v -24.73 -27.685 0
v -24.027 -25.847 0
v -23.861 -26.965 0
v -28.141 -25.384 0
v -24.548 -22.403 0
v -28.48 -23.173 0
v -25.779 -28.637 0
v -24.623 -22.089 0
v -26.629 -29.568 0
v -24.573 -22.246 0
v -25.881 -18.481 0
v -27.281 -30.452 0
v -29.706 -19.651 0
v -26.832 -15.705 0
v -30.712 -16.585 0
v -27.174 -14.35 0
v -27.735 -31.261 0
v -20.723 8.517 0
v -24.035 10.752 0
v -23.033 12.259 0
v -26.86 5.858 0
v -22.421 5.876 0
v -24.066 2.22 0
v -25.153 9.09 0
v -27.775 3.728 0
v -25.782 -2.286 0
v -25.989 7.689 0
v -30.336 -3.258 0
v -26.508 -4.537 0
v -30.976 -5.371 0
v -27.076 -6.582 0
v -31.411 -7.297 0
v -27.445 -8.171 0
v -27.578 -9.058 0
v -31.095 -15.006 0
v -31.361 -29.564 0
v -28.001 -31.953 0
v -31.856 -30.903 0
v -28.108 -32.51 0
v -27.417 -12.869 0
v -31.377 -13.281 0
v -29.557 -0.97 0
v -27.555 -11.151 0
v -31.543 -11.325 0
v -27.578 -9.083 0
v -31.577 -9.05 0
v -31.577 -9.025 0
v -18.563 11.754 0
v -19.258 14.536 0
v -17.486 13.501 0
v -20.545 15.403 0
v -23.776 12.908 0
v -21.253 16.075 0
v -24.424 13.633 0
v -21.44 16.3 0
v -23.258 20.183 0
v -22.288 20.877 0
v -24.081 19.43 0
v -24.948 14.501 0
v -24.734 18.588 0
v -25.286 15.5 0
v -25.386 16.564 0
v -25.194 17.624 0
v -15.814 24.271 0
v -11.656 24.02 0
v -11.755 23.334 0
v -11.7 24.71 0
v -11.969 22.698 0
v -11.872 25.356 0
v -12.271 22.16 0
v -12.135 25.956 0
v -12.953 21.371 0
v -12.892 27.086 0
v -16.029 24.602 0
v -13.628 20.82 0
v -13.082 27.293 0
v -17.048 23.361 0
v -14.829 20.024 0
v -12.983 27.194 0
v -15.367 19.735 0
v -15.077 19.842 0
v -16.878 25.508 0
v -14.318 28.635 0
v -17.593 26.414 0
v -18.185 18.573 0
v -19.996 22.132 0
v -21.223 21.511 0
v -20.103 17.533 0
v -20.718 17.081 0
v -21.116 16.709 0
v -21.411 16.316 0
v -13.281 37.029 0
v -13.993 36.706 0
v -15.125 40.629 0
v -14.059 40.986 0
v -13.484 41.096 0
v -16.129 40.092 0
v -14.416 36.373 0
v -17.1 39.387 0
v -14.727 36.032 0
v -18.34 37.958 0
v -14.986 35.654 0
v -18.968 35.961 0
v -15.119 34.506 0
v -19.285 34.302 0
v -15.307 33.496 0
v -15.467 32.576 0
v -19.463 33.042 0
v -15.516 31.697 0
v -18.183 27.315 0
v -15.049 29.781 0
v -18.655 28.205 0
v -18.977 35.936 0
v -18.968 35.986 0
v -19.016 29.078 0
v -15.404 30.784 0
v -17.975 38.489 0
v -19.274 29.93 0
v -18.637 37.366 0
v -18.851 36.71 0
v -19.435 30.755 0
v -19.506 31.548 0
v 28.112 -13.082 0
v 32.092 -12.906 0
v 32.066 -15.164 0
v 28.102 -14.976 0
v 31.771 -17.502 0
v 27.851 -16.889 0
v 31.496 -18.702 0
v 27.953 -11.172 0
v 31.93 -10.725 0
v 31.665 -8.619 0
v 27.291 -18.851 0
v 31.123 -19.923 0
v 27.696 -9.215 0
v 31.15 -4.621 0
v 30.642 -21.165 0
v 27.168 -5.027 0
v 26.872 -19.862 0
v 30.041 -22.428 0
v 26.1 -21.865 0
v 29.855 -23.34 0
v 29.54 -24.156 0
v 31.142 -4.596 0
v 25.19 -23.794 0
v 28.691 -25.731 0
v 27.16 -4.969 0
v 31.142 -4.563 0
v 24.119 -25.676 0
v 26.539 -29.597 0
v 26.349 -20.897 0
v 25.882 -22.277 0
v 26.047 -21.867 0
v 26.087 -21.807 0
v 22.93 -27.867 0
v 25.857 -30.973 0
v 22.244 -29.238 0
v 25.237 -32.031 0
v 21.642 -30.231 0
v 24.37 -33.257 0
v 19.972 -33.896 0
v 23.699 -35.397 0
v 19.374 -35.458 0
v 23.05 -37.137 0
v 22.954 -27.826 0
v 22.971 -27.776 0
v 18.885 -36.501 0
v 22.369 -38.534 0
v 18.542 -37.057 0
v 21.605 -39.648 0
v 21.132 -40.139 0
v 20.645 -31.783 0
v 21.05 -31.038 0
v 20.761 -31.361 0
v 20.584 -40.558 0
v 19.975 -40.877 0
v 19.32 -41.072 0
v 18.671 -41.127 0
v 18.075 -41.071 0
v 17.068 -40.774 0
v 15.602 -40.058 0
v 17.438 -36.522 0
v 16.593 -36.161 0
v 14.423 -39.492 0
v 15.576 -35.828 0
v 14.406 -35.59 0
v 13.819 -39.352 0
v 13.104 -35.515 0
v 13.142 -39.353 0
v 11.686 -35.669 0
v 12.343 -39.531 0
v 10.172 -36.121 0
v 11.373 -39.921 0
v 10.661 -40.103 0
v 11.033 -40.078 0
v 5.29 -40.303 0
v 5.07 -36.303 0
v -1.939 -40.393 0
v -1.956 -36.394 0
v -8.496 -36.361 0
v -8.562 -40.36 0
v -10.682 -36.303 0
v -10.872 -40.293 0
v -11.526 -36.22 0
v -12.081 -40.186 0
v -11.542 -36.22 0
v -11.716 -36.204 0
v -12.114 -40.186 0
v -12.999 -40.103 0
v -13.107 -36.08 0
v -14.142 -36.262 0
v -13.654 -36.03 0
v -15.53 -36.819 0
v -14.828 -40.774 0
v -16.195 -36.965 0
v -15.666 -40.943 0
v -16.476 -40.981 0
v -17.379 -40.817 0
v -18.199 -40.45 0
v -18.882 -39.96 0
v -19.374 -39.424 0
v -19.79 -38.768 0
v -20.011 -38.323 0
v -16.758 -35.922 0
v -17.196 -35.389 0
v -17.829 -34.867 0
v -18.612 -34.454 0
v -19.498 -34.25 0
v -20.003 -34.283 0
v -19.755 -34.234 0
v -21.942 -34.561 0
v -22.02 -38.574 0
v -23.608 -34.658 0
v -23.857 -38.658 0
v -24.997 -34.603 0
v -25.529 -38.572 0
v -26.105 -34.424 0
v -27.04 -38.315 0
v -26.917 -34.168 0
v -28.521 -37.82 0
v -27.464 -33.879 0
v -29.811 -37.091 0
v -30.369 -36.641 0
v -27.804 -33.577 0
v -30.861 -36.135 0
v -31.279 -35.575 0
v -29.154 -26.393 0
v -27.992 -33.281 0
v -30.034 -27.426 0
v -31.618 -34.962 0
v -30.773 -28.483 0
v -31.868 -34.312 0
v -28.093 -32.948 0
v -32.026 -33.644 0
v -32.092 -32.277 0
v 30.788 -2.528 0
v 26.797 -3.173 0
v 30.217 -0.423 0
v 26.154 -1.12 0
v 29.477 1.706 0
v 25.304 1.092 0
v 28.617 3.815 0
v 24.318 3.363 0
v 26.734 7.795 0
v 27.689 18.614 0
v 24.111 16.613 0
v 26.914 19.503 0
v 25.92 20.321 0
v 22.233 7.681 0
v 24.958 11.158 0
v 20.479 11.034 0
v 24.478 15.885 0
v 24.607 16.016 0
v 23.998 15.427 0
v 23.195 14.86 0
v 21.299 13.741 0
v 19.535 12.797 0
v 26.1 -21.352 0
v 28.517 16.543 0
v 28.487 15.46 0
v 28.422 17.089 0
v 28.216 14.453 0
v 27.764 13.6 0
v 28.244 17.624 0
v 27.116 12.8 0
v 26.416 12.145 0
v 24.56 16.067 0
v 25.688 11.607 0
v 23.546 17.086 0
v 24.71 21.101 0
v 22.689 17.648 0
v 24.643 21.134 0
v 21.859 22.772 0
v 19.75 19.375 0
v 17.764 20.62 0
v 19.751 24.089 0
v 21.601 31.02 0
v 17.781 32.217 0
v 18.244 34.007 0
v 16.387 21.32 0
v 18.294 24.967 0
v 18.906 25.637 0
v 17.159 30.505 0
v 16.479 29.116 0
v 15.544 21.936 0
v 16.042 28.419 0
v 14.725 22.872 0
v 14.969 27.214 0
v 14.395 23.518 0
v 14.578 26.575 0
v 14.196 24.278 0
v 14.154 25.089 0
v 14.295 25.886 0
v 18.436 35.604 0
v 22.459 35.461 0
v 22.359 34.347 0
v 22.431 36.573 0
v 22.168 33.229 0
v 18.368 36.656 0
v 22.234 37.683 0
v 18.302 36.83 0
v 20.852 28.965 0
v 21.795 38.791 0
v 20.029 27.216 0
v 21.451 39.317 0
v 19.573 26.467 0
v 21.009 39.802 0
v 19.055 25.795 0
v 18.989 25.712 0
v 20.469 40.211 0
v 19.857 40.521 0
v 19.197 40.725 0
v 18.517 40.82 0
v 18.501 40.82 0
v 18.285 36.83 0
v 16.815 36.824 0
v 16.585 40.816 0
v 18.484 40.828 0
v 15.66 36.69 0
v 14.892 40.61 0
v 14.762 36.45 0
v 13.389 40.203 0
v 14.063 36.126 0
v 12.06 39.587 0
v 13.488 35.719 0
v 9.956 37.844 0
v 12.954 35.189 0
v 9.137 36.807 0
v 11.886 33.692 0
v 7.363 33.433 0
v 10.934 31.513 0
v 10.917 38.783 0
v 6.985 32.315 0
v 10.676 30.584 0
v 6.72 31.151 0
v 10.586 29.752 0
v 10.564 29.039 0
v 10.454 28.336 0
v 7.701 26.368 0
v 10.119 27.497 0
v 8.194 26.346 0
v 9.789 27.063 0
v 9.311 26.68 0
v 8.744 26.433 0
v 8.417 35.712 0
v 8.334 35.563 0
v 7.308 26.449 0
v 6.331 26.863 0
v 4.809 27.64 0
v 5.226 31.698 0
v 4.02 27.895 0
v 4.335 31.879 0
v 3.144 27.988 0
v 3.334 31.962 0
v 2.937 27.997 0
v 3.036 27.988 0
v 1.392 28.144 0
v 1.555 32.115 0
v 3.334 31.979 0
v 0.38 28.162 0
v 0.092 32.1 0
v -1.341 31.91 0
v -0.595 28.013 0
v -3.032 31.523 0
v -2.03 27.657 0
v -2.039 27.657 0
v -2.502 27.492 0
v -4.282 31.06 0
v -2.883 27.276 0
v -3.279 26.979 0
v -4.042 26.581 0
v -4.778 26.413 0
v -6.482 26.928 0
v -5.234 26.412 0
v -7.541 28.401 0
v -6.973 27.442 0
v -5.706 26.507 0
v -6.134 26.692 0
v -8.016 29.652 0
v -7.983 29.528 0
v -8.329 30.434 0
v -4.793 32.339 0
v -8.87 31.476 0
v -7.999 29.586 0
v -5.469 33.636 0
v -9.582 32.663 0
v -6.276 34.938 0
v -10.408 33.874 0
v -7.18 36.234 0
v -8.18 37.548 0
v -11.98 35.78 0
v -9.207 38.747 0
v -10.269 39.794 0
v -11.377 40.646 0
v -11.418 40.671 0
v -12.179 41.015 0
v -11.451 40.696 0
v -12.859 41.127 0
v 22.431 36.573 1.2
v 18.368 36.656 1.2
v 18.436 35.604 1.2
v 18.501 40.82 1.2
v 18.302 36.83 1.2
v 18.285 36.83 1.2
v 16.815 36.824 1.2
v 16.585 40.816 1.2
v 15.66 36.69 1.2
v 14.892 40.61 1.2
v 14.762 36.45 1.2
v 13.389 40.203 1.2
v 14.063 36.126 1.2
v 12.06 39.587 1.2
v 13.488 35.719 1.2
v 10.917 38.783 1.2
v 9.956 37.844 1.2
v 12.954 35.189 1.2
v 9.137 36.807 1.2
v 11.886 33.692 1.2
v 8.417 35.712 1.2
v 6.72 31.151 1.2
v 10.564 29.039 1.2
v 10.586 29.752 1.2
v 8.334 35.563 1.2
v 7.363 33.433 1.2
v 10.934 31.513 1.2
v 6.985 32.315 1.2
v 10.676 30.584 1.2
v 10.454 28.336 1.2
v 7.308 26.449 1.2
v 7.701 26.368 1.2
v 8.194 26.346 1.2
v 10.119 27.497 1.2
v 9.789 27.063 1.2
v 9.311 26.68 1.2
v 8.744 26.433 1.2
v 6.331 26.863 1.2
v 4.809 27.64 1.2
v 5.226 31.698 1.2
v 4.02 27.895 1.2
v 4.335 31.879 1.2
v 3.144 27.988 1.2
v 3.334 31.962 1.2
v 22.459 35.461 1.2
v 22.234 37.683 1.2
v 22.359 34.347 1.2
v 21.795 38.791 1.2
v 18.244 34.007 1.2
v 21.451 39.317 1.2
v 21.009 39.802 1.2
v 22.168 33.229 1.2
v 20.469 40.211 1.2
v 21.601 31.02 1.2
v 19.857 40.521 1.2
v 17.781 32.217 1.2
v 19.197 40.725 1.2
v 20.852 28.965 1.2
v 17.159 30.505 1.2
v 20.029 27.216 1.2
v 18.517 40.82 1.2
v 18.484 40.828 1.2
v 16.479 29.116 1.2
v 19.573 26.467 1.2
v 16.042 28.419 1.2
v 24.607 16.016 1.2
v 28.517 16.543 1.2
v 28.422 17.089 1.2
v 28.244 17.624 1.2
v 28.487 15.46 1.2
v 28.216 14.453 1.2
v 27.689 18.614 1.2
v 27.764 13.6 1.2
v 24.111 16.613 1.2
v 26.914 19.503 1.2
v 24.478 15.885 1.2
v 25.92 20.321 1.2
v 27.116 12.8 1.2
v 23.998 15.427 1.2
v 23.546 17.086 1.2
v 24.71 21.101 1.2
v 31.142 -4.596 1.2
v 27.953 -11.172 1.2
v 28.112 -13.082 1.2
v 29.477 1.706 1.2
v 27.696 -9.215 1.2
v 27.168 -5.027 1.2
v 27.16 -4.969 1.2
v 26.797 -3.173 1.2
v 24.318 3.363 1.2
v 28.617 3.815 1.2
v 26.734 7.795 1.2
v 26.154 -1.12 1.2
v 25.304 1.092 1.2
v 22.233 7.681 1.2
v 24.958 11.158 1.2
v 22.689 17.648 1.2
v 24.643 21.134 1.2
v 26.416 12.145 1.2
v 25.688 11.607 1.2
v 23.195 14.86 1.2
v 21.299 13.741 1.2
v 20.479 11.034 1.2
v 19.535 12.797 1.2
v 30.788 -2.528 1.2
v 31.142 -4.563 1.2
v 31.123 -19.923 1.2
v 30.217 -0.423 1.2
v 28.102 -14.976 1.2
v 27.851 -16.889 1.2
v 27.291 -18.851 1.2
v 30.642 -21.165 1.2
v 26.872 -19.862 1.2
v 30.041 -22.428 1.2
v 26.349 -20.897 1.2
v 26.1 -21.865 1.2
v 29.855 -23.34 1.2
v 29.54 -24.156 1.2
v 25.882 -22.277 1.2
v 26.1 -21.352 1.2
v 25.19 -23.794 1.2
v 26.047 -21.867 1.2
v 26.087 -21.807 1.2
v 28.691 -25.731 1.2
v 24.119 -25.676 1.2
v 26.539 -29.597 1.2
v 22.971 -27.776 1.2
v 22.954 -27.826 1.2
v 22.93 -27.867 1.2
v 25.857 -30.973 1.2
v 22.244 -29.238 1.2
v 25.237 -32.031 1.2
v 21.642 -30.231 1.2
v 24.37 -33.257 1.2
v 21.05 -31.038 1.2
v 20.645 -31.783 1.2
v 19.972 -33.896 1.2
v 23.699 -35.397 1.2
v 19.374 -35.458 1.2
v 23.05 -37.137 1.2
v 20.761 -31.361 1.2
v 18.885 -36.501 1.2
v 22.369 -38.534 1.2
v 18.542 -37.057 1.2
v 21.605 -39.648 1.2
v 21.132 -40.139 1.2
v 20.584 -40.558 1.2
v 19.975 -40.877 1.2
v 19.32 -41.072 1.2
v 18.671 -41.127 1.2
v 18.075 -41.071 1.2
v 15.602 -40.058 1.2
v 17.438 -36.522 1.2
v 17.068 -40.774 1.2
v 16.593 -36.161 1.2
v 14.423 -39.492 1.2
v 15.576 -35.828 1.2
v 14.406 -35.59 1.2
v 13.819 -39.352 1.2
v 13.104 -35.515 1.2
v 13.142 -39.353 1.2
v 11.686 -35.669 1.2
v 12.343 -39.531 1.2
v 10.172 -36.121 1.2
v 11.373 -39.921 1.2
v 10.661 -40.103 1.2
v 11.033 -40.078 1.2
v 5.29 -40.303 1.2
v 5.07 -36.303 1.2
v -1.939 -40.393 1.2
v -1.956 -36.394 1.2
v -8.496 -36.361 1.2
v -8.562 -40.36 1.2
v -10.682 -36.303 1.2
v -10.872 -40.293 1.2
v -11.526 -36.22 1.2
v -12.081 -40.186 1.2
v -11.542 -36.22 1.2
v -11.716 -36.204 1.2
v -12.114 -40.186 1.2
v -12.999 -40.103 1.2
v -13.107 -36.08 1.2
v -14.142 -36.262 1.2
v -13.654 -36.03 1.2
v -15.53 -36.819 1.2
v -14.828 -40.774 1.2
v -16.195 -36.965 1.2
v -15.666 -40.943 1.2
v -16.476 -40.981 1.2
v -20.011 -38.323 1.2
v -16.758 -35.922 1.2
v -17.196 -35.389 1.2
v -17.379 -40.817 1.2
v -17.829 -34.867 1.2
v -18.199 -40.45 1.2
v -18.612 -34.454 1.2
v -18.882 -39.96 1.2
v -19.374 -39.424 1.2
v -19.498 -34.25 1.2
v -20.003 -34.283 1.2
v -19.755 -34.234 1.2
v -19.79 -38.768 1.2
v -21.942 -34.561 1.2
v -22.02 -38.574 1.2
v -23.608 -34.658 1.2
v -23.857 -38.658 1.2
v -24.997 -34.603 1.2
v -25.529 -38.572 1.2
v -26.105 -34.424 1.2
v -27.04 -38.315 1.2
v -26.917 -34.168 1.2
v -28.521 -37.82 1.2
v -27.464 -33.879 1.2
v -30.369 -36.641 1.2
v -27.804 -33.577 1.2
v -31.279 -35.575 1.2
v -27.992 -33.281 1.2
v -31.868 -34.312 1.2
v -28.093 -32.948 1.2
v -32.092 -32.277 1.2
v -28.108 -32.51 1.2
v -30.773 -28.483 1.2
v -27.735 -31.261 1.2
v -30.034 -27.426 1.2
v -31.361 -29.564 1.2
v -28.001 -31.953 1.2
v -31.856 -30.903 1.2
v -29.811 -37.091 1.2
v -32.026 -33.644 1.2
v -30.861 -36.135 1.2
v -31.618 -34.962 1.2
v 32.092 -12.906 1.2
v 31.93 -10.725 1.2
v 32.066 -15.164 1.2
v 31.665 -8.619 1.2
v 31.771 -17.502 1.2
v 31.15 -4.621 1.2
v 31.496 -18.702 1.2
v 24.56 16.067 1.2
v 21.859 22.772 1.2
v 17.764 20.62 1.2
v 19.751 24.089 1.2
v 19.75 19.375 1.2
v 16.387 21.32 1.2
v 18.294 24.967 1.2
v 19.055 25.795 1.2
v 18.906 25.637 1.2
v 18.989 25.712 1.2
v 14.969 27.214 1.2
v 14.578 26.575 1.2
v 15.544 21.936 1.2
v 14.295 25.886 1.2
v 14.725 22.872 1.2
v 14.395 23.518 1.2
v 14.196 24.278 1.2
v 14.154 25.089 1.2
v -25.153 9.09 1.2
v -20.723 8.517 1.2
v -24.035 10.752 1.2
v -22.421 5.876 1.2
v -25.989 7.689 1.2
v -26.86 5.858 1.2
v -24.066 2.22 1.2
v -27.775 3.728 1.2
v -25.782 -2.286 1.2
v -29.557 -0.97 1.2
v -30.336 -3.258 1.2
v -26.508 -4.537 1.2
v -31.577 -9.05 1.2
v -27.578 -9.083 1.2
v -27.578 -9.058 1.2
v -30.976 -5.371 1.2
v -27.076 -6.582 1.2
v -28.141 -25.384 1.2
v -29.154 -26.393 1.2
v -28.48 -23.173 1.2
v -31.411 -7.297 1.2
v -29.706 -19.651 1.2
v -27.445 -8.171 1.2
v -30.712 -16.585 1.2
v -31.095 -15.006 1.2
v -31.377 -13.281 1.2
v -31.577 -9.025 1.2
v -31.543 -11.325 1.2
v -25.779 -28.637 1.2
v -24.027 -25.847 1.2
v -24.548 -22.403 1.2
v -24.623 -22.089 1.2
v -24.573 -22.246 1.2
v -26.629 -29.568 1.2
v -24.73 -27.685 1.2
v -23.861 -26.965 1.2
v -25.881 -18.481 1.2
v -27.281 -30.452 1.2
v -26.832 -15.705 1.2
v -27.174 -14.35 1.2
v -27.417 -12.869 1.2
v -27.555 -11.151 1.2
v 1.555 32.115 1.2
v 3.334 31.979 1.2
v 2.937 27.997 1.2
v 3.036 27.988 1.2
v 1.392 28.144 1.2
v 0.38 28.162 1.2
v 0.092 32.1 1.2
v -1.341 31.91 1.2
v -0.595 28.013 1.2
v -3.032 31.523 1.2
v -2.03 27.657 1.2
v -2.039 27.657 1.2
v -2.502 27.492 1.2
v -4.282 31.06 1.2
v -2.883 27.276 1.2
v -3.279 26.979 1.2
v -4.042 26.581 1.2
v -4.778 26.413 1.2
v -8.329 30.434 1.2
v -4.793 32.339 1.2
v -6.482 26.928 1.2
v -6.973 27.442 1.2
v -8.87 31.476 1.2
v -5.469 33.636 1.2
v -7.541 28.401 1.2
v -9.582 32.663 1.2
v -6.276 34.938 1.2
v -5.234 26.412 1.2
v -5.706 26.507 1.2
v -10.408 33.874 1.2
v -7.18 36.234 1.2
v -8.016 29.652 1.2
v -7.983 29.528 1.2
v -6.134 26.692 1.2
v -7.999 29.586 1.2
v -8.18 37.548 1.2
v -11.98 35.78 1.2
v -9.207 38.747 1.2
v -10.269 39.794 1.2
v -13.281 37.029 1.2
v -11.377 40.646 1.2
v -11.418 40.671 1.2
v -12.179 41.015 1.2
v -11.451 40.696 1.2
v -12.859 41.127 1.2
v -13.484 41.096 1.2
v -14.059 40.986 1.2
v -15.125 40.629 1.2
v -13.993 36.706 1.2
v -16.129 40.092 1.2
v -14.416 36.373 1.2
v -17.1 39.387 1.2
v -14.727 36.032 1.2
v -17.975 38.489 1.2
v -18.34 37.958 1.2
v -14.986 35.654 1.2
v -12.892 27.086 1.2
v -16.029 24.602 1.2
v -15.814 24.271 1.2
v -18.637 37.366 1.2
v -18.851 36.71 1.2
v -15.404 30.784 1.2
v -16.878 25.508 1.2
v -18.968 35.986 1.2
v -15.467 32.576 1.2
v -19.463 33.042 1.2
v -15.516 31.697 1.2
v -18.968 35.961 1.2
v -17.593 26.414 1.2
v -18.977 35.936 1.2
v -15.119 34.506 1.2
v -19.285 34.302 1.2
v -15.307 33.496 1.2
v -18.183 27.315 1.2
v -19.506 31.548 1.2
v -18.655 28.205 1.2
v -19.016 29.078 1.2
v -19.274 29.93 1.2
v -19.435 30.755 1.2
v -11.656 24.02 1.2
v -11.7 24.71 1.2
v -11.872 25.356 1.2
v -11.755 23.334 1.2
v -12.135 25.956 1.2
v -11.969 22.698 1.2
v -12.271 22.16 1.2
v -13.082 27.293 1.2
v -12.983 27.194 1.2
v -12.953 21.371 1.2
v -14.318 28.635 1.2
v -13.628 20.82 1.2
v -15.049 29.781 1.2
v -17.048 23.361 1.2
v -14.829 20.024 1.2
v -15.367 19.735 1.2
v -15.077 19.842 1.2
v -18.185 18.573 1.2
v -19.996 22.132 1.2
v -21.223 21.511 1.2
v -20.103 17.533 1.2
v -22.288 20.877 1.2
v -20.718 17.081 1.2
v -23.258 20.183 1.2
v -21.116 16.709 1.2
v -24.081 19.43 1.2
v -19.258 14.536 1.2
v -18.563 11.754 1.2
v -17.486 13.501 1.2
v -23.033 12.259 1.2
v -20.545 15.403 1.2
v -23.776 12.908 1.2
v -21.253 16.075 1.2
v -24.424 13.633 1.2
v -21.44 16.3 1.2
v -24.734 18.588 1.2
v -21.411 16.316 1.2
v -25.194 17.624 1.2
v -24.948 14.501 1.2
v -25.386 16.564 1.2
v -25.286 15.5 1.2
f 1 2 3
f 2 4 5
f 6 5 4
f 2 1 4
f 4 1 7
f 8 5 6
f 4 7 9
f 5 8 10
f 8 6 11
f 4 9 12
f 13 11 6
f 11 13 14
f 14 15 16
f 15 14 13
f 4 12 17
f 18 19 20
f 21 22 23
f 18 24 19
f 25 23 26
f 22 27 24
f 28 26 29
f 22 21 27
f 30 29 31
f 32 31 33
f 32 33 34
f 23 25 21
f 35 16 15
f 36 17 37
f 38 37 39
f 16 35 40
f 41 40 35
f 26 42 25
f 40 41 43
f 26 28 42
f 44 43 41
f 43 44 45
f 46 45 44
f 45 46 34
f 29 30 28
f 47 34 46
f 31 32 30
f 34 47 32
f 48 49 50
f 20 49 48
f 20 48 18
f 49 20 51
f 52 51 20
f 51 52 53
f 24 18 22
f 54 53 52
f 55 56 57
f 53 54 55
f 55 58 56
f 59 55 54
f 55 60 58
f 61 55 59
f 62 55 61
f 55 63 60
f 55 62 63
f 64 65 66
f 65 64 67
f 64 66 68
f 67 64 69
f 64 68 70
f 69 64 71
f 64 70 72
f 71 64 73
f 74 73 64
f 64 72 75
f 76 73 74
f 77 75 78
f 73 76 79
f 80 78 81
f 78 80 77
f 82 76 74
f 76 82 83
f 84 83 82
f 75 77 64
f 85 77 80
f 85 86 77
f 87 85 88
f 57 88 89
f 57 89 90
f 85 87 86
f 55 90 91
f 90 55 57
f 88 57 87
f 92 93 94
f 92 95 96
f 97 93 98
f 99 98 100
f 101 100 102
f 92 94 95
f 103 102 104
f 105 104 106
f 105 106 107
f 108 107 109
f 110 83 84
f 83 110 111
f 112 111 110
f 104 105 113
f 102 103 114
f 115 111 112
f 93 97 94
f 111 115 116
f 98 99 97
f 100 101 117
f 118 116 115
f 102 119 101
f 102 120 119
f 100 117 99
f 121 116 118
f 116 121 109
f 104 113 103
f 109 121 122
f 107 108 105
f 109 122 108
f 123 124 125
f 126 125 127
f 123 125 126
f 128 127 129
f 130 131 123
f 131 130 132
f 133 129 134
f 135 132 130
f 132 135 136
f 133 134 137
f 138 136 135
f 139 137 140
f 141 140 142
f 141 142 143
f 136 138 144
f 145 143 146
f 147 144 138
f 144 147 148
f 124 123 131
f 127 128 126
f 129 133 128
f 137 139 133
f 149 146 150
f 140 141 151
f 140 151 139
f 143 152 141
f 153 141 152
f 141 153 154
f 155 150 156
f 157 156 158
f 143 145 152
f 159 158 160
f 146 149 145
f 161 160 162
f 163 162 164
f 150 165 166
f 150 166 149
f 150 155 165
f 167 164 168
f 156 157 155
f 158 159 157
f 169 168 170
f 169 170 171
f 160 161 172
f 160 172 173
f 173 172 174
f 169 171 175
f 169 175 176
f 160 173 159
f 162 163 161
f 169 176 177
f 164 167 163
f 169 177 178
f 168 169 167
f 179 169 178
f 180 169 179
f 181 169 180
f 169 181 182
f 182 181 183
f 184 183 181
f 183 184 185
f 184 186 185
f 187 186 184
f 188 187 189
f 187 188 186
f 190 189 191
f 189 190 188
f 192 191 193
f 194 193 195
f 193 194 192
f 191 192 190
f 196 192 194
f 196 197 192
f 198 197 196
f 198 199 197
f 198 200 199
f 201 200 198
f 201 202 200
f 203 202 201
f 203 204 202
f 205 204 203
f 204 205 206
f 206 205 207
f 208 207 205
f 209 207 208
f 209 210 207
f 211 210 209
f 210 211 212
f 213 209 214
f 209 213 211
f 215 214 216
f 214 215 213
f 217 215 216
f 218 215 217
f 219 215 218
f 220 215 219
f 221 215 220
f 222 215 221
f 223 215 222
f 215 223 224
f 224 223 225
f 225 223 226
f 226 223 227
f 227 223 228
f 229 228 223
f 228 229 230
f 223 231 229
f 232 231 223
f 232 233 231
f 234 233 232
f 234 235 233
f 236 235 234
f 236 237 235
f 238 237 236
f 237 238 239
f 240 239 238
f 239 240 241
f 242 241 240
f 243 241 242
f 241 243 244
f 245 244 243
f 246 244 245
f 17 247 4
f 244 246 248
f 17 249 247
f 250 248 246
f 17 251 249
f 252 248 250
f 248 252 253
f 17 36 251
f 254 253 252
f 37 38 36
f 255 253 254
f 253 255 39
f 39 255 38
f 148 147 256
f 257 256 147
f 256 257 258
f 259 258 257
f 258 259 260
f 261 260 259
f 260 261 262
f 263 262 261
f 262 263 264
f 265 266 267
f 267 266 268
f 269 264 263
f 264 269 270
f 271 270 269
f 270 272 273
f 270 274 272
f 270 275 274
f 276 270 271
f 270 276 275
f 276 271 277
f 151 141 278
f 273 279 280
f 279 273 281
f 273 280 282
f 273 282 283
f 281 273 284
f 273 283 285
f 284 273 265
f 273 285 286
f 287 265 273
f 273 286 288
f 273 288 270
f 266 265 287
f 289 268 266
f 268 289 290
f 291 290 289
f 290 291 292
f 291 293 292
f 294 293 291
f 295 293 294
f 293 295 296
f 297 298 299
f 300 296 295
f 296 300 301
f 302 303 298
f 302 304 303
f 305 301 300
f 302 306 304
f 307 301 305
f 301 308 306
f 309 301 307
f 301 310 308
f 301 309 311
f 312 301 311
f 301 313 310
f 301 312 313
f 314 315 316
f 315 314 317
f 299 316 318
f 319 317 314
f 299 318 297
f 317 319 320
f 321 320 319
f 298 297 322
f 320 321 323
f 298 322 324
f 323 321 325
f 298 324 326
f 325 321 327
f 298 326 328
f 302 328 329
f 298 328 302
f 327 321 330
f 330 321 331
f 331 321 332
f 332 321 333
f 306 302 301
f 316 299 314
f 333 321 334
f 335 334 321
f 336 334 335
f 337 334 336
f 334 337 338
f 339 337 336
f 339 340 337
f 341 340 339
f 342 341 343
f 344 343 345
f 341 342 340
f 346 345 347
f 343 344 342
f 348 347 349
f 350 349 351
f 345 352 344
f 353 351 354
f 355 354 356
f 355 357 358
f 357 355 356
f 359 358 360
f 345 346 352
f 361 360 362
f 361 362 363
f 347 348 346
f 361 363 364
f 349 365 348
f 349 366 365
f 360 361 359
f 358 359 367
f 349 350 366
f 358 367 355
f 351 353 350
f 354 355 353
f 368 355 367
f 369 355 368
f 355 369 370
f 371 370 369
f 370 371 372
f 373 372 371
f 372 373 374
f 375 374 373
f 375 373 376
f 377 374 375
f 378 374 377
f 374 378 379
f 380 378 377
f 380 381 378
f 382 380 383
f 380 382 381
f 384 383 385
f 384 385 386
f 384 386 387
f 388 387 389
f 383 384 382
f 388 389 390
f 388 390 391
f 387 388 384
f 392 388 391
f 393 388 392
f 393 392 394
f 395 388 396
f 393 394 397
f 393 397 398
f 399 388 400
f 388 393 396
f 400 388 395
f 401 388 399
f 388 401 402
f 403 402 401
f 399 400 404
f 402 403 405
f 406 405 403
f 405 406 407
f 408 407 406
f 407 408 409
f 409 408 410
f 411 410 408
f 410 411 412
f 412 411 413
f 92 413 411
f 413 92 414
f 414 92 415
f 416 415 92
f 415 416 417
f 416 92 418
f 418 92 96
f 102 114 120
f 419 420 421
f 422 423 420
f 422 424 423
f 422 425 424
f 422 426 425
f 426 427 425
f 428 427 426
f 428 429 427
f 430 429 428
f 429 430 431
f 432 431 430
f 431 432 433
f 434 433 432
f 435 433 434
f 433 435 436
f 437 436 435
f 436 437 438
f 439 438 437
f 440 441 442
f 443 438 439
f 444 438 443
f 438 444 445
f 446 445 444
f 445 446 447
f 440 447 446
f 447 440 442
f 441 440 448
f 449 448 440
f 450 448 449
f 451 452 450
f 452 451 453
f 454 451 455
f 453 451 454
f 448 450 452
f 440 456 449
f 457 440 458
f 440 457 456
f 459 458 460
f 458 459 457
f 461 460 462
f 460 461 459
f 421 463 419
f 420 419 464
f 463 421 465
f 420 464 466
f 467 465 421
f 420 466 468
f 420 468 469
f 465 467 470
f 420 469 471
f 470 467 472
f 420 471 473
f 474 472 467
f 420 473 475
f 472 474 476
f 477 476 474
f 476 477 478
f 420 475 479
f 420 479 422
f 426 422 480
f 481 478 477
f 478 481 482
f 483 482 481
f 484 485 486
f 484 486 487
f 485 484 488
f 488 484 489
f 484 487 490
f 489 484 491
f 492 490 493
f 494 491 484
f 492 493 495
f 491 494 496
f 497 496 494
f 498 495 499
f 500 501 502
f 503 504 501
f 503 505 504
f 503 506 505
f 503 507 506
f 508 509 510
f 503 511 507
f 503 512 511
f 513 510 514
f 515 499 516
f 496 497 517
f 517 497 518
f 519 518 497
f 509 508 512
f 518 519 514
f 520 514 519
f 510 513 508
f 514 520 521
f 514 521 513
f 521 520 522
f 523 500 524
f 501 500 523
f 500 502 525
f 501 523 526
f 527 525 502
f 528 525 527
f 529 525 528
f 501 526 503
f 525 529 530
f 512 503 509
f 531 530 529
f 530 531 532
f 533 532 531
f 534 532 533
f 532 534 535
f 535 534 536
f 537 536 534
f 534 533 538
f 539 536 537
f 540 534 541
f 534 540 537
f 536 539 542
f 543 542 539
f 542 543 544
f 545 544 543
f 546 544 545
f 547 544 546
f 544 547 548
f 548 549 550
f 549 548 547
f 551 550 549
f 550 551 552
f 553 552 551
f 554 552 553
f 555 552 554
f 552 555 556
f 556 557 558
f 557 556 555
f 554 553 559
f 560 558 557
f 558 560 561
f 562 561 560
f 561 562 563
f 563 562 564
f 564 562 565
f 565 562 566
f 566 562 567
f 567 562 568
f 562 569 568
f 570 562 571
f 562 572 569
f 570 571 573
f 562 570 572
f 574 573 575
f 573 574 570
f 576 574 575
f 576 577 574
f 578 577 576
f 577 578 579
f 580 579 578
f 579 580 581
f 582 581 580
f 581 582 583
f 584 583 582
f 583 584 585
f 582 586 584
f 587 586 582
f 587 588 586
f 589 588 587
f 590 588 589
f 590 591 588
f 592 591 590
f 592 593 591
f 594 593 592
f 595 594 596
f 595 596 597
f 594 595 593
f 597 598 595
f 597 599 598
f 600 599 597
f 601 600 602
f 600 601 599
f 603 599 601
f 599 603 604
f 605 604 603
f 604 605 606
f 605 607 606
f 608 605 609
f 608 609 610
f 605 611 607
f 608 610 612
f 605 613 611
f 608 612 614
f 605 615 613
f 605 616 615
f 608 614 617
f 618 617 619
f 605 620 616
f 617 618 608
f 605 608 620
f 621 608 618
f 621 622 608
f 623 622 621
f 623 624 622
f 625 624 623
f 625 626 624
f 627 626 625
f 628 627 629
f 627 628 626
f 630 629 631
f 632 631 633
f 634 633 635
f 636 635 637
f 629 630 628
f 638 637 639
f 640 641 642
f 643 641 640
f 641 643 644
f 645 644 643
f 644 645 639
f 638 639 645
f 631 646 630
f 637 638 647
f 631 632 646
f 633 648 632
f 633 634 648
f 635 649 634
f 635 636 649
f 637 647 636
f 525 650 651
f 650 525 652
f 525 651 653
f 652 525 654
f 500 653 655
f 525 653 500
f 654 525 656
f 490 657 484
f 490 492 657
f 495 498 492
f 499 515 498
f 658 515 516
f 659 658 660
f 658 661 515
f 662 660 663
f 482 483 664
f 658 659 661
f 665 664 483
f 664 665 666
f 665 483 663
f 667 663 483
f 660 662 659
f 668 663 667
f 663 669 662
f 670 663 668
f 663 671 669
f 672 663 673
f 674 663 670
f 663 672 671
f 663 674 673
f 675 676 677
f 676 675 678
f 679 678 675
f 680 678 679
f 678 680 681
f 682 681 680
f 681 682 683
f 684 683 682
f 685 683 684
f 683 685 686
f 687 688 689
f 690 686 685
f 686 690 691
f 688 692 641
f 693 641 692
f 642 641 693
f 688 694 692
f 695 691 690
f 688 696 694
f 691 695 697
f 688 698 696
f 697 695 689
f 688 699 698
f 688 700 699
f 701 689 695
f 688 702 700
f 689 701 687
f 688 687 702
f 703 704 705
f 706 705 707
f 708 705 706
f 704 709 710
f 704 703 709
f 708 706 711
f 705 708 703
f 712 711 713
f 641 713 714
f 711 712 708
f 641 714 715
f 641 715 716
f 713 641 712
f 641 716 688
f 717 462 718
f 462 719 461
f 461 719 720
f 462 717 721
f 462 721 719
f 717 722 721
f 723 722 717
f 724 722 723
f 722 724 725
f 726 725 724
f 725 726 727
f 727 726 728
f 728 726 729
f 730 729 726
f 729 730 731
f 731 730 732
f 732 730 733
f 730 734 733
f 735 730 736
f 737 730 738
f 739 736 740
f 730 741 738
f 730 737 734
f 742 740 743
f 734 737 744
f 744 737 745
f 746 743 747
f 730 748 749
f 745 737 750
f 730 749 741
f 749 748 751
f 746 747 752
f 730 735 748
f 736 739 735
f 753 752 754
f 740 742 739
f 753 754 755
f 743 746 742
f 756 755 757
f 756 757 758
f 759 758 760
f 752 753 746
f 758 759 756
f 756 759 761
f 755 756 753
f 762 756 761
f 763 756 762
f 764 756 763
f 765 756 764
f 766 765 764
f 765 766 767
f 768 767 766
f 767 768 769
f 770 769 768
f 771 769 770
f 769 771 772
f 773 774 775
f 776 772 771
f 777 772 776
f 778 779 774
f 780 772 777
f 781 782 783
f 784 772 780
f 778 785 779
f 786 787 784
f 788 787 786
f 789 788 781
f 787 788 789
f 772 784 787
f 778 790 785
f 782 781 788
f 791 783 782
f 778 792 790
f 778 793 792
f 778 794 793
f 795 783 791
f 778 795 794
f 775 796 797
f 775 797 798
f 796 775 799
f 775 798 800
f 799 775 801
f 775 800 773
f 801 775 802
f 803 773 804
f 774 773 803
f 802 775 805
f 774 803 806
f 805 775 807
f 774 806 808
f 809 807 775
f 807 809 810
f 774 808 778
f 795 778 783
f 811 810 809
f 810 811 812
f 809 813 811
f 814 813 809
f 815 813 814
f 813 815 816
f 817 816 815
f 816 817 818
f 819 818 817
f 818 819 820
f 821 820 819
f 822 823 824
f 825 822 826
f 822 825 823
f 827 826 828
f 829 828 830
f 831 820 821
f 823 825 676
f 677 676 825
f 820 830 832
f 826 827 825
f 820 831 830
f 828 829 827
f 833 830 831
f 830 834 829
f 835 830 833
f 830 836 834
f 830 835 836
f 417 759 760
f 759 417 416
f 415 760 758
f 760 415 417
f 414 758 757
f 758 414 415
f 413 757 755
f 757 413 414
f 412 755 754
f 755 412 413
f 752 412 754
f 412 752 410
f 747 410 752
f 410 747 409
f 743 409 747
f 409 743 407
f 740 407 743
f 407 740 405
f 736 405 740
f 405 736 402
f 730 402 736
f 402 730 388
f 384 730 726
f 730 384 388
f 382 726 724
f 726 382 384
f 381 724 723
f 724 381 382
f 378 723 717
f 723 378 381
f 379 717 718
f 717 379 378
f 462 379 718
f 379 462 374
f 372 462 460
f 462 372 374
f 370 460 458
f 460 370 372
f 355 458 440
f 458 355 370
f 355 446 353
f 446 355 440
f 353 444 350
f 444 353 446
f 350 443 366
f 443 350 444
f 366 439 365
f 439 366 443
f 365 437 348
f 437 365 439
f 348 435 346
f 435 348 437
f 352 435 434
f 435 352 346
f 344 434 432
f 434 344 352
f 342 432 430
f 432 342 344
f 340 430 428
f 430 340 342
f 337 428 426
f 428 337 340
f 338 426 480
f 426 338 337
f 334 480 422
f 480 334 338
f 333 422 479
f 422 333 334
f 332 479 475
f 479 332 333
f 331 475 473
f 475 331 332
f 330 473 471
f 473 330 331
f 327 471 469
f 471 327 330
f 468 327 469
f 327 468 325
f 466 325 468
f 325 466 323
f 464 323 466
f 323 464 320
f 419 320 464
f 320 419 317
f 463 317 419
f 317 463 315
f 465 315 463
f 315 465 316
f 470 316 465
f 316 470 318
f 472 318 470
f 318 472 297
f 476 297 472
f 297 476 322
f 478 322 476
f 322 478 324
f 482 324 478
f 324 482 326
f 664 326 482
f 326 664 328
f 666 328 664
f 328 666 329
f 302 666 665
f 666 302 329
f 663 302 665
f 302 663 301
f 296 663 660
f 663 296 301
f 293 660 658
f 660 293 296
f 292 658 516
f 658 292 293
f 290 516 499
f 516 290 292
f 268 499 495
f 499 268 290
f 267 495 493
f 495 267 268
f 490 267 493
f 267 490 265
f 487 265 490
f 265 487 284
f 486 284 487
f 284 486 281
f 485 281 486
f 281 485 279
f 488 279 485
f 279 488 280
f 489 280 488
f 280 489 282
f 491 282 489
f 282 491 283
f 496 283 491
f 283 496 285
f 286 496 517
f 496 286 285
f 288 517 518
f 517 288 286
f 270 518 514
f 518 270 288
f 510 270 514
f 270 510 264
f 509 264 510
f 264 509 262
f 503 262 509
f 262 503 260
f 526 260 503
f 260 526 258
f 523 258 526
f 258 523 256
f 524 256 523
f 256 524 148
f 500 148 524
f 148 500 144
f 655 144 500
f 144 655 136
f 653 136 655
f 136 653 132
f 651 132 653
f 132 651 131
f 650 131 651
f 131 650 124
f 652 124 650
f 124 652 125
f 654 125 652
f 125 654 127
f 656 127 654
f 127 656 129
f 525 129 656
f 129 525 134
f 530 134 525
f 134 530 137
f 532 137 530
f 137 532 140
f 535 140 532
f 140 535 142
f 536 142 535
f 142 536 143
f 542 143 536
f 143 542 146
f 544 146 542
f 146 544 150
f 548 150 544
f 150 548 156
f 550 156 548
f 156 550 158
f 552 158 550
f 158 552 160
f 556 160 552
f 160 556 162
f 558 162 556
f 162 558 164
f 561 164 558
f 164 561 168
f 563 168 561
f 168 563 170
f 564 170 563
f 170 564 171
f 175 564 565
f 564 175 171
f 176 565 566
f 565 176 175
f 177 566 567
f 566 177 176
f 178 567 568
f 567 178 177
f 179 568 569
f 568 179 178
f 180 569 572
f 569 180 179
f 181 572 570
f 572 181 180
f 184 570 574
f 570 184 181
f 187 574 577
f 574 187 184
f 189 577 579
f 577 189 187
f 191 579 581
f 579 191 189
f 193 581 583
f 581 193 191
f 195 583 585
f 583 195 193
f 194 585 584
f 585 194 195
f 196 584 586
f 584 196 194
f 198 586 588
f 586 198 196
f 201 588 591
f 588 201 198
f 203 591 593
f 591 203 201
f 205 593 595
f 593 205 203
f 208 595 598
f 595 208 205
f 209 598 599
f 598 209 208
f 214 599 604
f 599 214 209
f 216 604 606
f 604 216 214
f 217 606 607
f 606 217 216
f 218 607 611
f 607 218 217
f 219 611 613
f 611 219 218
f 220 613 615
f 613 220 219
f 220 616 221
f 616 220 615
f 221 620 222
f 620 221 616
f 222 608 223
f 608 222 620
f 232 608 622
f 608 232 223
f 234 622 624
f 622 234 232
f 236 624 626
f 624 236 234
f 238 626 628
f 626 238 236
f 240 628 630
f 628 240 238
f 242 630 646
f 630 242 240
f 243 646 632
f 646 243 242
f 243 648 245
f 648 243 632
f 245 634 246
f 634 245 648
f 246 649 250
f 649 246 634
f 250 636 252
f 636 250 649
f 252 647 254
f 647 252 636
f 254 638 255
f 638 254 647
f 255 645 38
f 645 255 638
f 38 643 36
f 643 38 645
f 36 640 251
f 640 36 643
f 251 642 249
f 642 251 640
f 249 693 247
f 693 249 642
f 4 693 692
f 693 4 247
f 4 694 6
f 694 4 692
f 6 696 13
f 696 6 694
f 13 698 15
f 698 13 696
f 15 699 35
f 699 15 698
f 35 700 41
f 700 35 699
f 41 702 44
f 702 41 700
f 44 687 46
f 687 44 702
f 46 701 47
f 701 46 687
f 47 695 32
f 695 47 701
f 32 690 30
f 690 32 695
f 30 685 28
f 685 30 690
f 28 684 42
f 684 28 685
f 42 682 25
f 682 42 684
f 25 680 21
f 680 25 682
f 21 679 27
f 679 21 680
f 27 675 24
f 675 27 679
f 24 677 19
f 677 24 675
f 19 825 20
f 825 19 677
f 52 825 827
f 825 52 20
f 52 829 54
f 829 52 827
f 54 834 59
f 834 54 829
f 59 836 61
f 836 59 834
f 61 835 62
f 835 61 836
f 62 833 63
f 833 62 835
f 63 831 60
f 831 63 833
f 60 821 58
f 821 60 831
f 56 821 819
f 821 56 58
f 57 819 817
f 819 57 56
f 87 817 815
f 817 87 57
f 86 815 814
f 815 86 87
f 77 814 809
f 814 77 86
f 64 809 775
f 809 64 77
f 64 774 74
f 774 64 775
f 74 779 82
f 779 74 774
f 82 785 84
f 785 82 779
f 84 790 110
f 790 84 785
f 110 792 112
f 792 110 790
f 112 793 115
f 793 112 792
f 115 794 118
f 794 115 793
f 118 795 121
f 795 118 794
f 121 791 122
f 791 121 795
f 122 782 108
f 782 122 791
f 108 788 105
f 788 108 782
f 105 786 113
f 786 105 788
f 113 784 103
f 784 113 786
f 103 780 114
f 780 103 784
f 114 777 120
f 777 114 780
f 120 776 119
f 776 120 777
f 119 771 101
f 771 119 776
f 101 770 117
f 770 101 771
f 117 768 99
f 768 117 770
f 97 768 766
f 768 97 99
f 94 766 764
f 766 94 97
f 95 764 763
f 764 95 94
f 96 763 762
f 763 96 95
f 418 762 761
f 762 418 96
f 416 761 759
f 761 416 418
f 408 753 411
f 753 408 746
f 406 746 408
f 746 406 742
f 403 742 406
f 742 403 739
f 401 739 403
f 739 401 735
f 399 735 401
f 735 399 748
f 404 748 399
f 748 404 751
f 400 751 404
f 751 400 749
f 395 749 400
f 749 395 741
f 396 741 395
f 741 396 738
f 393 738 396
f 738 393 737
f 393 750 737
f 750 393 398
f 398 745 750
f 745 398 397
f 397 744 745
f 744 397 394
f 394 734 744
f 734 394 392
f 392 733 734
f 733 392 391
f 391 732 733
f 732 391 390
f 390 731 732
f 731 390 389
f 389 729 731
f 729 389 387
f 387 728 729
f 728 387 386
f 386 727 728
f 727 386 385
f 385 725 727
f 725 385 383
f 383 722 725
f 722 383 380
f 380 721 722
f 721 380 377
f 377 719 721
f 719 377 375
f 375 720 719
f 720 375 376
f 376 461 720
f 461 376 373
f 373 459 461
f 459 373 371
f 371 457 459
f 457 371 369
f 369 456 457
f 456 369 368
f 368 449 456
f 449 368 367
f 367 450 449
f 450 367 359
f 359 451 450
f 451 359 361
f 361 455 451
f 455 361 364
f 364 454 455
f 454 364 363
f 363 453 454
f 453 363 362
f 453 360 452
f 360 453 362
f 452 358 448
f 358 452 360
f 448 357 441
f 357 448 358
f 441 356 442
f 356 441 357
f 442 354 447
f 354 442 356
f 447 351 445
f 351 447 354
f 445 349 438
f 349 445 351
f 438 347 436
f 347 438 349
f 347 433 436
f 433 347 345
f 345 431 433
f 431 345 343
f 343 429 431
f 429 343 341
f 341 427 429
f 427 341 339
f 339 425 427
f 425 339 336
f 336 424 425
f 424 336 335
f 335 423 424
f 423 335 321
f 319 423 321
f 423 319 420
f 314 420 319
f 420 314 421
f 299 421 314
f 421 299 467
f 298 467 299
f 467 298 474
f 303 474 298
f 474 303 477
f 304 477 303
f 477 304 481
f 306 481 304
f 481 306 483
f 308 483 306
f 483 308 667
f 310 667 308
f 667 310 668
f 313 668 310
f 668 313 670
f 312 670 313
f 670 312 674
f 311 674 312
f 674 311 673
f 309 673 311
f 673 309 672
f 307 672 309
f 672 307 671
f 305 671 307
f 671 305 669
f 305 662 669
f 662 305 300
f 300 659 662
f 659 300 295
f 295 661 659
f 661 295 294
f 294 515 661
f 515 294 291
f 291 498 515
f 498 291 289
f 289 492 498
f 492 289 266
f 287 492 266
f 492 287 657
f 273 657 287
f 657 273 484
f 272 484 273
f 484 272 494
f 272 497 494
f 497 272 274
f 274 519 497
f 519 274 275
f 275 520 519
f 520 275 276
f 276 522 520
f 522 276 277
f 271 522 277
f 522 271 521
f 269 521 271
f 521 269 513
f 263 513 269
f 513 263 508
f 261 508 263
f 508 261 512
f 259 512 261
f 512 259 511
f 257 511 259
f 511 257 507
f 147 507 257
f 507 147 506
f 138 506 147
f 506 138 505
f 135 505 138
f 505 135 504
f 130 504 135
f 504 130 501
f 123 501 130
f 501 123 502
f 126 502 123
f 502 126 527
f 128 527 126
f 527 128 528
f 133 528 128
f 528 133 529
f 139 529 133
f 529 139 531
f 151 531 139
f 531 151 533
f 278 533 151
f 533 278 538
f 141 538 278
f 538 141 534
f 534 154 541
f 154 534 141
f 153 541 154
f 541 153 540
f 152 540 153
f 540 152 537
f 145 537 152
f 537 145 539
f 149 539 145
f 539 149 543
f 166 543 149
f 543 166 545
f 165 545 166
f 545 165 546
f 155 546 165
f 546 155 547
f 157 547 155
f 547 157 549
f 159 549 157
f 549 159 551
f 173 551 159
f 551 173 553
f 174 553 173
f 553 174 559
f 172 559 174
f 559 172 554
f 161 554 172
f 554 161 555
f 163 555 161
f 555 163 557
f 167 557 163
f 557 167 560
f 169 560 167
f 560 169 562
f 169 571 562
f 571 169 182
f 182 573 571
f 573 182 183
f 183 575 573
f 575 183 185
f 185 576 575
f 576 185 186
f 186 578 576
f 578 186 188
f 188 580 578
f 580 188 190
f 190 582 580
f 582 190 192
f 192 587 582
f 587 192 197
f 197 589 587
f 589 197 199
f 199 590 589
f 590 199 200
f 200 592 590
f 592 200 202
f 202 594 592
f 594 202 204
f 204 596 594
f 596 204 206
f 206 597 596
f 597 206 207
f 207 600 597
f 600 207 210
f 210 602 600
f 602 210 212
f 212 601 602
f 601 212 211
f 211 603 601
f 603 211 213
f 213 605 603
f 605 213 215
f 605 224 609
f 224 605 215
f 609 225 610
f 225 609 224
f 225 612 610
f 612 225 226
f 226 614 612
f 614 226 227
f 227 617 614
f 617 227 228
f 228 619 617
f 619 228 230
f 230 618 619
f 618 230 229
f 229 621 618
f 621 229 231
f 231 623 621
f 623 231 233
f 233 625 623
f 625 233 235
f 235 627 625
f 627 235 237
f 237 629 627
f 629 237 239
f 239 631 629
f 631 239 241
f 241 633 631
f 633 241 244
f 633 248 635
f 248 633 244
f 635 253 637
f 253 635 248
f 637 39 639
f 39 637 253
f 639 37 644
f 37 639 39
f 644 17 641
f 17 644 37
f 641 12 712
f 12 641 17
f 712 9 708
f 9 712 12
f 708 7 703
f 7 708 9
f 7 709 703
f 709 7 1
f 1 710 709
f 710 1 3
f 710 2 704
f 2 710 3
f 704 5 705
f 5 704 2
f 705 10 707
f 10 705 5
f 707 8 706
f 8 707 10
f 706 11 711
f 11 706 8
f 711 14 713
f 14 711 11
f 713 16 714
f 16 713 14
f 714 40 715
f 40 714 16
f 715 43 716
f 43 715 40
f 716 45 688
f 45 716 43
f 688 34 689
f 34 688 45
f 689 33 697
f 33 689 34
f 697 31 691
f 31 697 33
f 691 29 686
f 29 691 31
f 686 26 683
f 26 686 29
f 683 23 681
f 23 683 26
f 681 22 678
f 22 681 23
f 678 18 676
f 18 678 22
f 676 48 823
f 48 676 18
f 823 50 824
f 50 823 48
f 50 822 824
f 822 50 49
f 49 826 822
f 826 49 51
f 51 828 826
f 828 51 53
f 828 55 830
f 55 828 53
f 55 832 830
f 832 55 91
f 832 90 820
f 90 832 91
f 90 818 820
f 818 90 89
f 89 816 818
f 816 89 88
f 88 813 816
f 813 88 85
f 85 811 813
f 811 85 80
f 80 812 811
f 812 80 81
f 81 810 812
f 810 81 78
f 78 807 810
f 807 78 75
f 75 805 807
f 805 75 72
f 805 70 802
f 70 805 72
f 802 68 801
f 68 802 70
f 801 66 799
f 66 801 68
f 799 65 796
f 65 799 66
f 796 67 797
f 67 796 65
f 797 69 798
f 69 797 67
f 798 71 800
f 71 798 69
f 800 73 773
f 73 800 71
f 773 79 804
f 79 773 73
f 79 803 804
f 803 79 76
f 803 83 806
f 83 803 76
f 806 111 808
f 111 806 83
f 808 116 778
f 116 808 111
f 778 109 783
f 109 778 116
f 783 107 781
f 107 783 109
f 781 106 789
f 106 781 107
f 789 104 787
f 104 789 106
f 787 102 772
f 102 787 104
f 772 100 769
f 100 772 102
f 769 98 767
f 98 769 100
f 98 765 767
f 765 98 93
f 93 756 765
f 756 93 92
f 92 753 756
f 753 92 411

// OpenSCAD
// Module names are of the form poly_<inkscape-path-id>().  As a result,
// you can associate a polygon in this OpenSCAD program with the corresponding
// SVG element in the Inkscape document by looking for the XML element with
// the attribute id="inkscape-path-id".

// fudge value is used to ensure that subtracted solids are a tad taller
// in the z dimension than the polygon being subtracted from.  This helps
// keep the resulting .stl file manifold.
fudge = 0.1;

module poly_path2993044(h)
{
  scale([25.4/90, -25.4/90, 1]) union()
  {
    difference()
    {
       linear_extrude(height=h)
         polygon([[-45.562566,-145.723931],[-47.776590,-145.614781],[-49.815937,-145.225260],[-53.594215,-143.961536],[-57.149337,-142.057231],[-60.589835,-139.560227],[-63.691199,-136.379709],[-64.984568,-134.497166],[-66.036988,-132.400586],[-66.796404,-130.075581],[-67.210761,-127.507767],[-67.210761,-127.419766],[-67.240048,-127.331765],[-68.334449,-121.541001],[-68.963849,-117.076408],[-69.117398,-111.784958],[-68.862596,-108.975845],[-68.291990,-106.052247],[-67.379881,-103.033230],[-66.100569,-99.937855],[-64.428353,-96.785188],[-62.337534,-93.594292],[-59.802412,-90.384231],[-56.797287,-87.174069],[-56.034613,-86.000725],[-60.405319,-82.774030],[-70.851936,-78.421588],[-75.198263,-76.220954],[-78.973487,-73.973950],[-82.411207,-71.513605],[-85.326842,-68.846686],[-87.639822,-65.861373],[-89.269580,-62.445846],[-89.950494,-58.690607],[-89.596725,-54.921552],[-88.397377,-51.379945],[-86.541555,-48.307052],[-84.246804,-45.736120],[-81.613511,-43.437674],[-85.162876,-38.098960],[-89.126437,-32.207431],[-92.085605,-27.245528],[-95.174589,-20.757917],[-98.415183,-13.210995],[-104.728386,3.437415],[-107.491441,11.545265],[-109.758556,19.030289],[-111.299936,25.854274],[-111.885784,31.979006],[-111.885784,32.066960],[-111.765598,40.127797],[-111.178659,47.060042],[-110.179607,53.170072],[-108.823081,58.764259],[-105.256163,69.630605],[-100.915018,82.110079],[-99.712341,89.942149],[-103.300353,93.518930],[-106.418914,97.179949],[-109.036881,100.925435],[-111.123110,104.755616],[-112.876654,109.497622],[-113.711572,114.365914],[-113.479594,119.210435],[-112.917186,121.576886],[-112.032452,123.881122],[-110.831905,126.054568],[-109.349568,128.038694],[-107.608172,129.829813],[-105.630452,131.424237],[-101.056966,134.008250],[-95.810972,135.761230],[-90.456222,136.673753],[-84.532805,136.976461],[-78.022415,136.678874],[-70.906747,135.790516],[-70.121744,137.366845],[-68.648060,139.691885],[-66.906323,141.589556],[-64.485618,143.327072],[-61.579444,144.625674],[-58.381301,145.206601],[-55.508416,145.071860],[-52.541635,144.476002],[-46.061190,142.097240],[-42.922495,142.390576],[-42.805160,142.390576],[-38.522455,142.771913],[-30.338381,143.006581],[-6.871503,143.123916],[18.743236,142.805757],[37.774234,142.097240],[39.094246,142.009286],[40.296923,141.451948],[43.734291,140.071113],[46.566663,139.439797],[48.965868,139.434455],[51.103736,139.931543],[55.282782,141.938831],[60.478439,144.473308],[64.044422,145.526688],[66.156487,145.723931],[68.457177,145.529318],[70.779153,144.841310],[72.936470,143.707780],[74.878160,142.223674],[76.553250,140.483939],[79.261580,136.537257],[81.673350,131.586352],[83.974426,125.422856],[86.350672,117.838401],[89.424035,113.495056],[91.618940,109.745969],[94.036075,104.872951],[101.662810,91.174160],[104.669944,85.591379],[105.783688,82.701826],[106.444187,79.470055],[108.572990,74.992941],[110.279917,70.592309],[111.601565,66.267015],[112.574533,62.015915],[113.620823,53.731722],[113.711572,45.730578],[113.139566,38.003334],[112.197593,30.540838],[110.374889,16.373485],[110.345602,16.285531],[110.345602,16.168197],[109.092004,8.957473],[107.067700,1.500296],[104.445840,-6.044728],[101.399572,-13.518991],[94.726410,-27.620809],[88.433405,-39.536306],[91.021150,-41.128135],[93.599621,-43.034533],[96.081007,-45.355171],[98.377494,-48.189717],[99.976582,-51.209658],[100.937524,-54.778580],[101.043789,-58.617103],[100.708751,-60.550158],[100.078843,-62.445846],[98.112172,-65.956691],[95.363329,-69.104049],[91.840881,-72.002334],[87.553397,-74.765957],[87.436062,-74.824624],[87.318728,-74.883292],[77.453026,-80.688901],[69.982571,-85.355386],[64.819858,-88.464748],[66.990544,-90.840769],[67.283880,-91.104771],[67.518549,-91.398107],[69.351383,-93.781534],[70.968556,-96.433383],[73.883940,-102.632875],[76.538325,-109.912832],[78.547982,-117.739678],[79.223226,-121.700838],[79.579539,-125.650030],[79.478741,-129.589415],[78.782651,-133.521154],[77.227819,-137.447667],[76.007414,-139.313881],[74.441278,-141.030555],[72.529526,-142.480384],[70.359091,-143.576741],[68.022397,-144.302013],[65.611865,-144.638588],[65.553198,-144.638588],[65.494531,-144.667922],[58.766337,-144.625353],[52.767267,-143.894437],[47.441111,-142.450254],[42.731659,-140.267882],[38.682493,-137.421400],[35.278156,-134.093028],[32.373874,-130.420051],[29.824875,-126.539758],[29.678207,-126.275756],[29.531539,-126.011753],[26.089519,-118.462736],[24.748608,-114.503576],[23.811488,-110.376945],[18.515886,-112.317364],[15.361234,-112.957544],[11.814046,-113.251638],[11.814046,-113.310305],[5.510101,-113.793808],[0.327440,-113.739627],[-4.751326,-113.067448],[-10.743585,-111.696957],[-15.172958,-110.054276],[-16.983966,-114.586220],[-19.380076,-119.181288],[-22.239317,-123.796225],[-25.439717,-128.387775],[-28.983862,-133.042522],[-32.621888,-137.294021],[-36.386863,-141.001099],[-40.311852,-144.022582],[-40.458520,-144.110583],[-40.575854,-144.198584],[-43.155447,-145.328495],[-45.562566,-145.723931]]);
       translate([0, 0, -fudge])
         linear_extrude(height=h+2*fudge)
           polygon([[-47.058579,-131.203800],[-42.449617,-126.778200],[-36.879821,-120.027699],[-33.951990,-115.733581],[-31.429700,-111.530218],[-29.513118,-107.835562],[-28.402411,-105.067564],[-28.343743,-104.832895],[-28.285076,-104.627560],[-26.721273,-100.633731],[-24.706377,-97.235493],[-22.967957,-95.414219],[-21.733369,-94.577667],[-20.218337,-93.920797],[-18.545721,-93.587467],[-16.931159,-93.588374],[-14.322284,-94.184799],[-11.619078,-95.596484],[-10.215580,-96.648821],[-8.864676,-97.411482],[-7.223553,-97.998167],[-7.194266,-97.998167],[-2.107303,-99.257600],[1.347992,-99.787162],[4.932198,-99.722896],[10.405893,-99.200844],[10.757896,-99.171511],[11.139233,-99.171511],[14.245470,-98.838971],[17.040966,-97.936738],[22.432668,-95.182142],[25.894033,-93.715462],[27.287818,-93.428409],[29.032994,-93.351492],[30.983371,-93.661895],[32.992763,-94.536802],[34.685468,-95.894275],[35.853810,-97.429402],[37.040800,-100.403522],[37.432585,-102.895236],[37.510137,-105.419567],[37.828470,-108.366936],[38.742806,-111.661000],[42.115512,-119.382360],[45.901065,-124.686928],[47.791930,-126.564347],[49.830249,-128.006438],[52.306465,-129.153097],[55.488548,-130.002687],[59.581516,-130.477491],[64.790384,-130.499794],[64.849051,-130.499794],[65.083720,-129.883788],[65.322768,-126.156358],[64.643716,-120.497037],[63.004524,-114.155760],[60.801014,-108.088925],[58.389462,-103.168109],[56.840979,-100.696858],[53.039169,-96.427213],[51.654233,-94.162661],[50.651589,-91.720777],[50.151954,-88.897091],[50.301489,-86.023897],[51.007412,-83.329786],[52.176936,-81.043347],[55.076061,-77.725726],[58.064259,-75.544278],[62.942367,-73.064609],[69.980120,-68.652723],[80.395858,-62.533847],[83.430073,-60.541305],[85.433430,-58.866296],[87.025251,-56.931130],[87.189954,-56.750433],[86.731915,-56.285790],[85.032614,-54.662828],[82.186526,-52.653474],[75.467813,-48.688388],[69.219757,-45.344358],[72.563787,-39.096302],[78.777115,-27.216257],[86.167017,-11.917314],[89.659390,-3.871046],[92.673357,3.967597],[94.951399,11.244499],[96.236001,17.605543],[96.265287,17.810878],[98.134761,32.649848],[99.046606,39.585417],[99.609335,46.352352],[99.572557,53.066135],[98.685879,59.842246],[96.698911,66.796170],[95.214571,70.375899],[93.361261,74.043386],[92.481253,75.656734],[92.481253,77.475417],[92.434451,77.269499],[92.291979,77.483083],[91.707630,78.935615],[89.254558,84.310145],[85.461911,90.976299],[81.393153,98.419606],[81.334486,98.595608],[81.246532,98.742276],[78.818985,103.599588],[76.684172,107.116887],[74.587805,109.977044],[73.561129,111.121054],[73.150459,112.617068],[70.765627,120.102519],[68.646384,125.637506],[66.916494,129.333648],[65.699725,131.302570],[61.789432,129.408397],[58.792395,128.130659],[55.189269,126.950901],[51.046434,126.107933],[46.430268,125.840565],[41.407149,126.387608],[36.043457,127.987873],[17.965702,128.632993],[-6.930264,128.955882],[-30.103806,128.838547],[-37.847876,128.633212],[-40.839903,128.339876],[-40.898570,128.339876],[-41.514576,128.281209],[-46.442620,127.841205],[-48.378638,127.665203],[-50.109320,128.486544],[-55.028488,130.459598],[-57.384053,130.979900],[-59.378737,127.283867],[-60.929118,125.393801],[-63.174084,123.543155],[-65.948731,122.081518],[-69.088158,121.358480],[-69.997500,121.299813],[-70.877508,121.475814],[-77.746967,122.460161],[-83.651099,122.804825],[-88.573151,122.609650],[-92.496370,121.974485],[-95.376143,121.069251],[-97.314885,120.045068],[-98.516384,118.973585],[-99.184430,117.926449],[-99.543255,116.746365],[-99.596271,115.194187],[-99.216031,113.218791],[-98.275088,110.769051],[-96.663997,107.901124],[-94.355280,104.769192],[-91.344442,101.469160],[-87.626992,98.096937],[-84.546964,95.544913],[-85.133636,91.584878],[-86.981653,79.382101],[-87.069607,78.824763],[-87.245609,78.267424],[-91.703277,65.483361],[-95.073997,55.646611],[-96.286370,50.846705],[-97.148546,45.599497],[-97.634375,39.510280],[-97.717703,32.184342],[-97.717703,32.155055],[-97.717703,32.096388],[-97.247516,28.954027],[-95.937645,23.321243],[-93.926456,16.077310],[-91.352312,8.101504],[-85.274165,-7.864850],[-79.442871,-20.821423],[-73.429484,-30.178841],[-65.773415,-41.648278],[-61.960047,-47.837667],[-68.237437,-51.504367],[-72.796936,-54.577101],[-75.306834,-56.960416],[-75.966930,-57.755536],[-75.864172,-57.811091],[-74.821499,-59.203590],[-73.410146,-60.525002],[-71.229464,-62.123129],[-64.434288,-65.809428],[-54.450646,-69.925867],[-53.423970,-70.307203],[-52.543962,-70.952543],[-48.289067,-73.773295],[-45.894938,-75.722333],[-43.479880,-78.520611],[-42.410508,-80.424657],[-41.652702,-82.678252],[-41.302481,-85.111713],[-41.455862,-87.555359],[-42.066674,-89.844565],[-42.999508,-91.969291],[-45.679900,-95.974102],[-46.002570,-96.355439],[-46.354573,-96.707442],[-50.734753,-101.461185],[-53.322134,-105.522298],[-54.581754,-109.077352],[-54.978651,-112.312916],[-54.803516,-115.426269],[-54.236224,-118.687057],[-53.570808,-122.266139],[-53.101300,-126.334376],[-52.183424,-127.672524],[-51.079208,-128.881485],[-49.581269,-130.059743],[-47.058579,-131.203753]]);
    }
  }
}

poly_path2993044(1.2000000476837158);
